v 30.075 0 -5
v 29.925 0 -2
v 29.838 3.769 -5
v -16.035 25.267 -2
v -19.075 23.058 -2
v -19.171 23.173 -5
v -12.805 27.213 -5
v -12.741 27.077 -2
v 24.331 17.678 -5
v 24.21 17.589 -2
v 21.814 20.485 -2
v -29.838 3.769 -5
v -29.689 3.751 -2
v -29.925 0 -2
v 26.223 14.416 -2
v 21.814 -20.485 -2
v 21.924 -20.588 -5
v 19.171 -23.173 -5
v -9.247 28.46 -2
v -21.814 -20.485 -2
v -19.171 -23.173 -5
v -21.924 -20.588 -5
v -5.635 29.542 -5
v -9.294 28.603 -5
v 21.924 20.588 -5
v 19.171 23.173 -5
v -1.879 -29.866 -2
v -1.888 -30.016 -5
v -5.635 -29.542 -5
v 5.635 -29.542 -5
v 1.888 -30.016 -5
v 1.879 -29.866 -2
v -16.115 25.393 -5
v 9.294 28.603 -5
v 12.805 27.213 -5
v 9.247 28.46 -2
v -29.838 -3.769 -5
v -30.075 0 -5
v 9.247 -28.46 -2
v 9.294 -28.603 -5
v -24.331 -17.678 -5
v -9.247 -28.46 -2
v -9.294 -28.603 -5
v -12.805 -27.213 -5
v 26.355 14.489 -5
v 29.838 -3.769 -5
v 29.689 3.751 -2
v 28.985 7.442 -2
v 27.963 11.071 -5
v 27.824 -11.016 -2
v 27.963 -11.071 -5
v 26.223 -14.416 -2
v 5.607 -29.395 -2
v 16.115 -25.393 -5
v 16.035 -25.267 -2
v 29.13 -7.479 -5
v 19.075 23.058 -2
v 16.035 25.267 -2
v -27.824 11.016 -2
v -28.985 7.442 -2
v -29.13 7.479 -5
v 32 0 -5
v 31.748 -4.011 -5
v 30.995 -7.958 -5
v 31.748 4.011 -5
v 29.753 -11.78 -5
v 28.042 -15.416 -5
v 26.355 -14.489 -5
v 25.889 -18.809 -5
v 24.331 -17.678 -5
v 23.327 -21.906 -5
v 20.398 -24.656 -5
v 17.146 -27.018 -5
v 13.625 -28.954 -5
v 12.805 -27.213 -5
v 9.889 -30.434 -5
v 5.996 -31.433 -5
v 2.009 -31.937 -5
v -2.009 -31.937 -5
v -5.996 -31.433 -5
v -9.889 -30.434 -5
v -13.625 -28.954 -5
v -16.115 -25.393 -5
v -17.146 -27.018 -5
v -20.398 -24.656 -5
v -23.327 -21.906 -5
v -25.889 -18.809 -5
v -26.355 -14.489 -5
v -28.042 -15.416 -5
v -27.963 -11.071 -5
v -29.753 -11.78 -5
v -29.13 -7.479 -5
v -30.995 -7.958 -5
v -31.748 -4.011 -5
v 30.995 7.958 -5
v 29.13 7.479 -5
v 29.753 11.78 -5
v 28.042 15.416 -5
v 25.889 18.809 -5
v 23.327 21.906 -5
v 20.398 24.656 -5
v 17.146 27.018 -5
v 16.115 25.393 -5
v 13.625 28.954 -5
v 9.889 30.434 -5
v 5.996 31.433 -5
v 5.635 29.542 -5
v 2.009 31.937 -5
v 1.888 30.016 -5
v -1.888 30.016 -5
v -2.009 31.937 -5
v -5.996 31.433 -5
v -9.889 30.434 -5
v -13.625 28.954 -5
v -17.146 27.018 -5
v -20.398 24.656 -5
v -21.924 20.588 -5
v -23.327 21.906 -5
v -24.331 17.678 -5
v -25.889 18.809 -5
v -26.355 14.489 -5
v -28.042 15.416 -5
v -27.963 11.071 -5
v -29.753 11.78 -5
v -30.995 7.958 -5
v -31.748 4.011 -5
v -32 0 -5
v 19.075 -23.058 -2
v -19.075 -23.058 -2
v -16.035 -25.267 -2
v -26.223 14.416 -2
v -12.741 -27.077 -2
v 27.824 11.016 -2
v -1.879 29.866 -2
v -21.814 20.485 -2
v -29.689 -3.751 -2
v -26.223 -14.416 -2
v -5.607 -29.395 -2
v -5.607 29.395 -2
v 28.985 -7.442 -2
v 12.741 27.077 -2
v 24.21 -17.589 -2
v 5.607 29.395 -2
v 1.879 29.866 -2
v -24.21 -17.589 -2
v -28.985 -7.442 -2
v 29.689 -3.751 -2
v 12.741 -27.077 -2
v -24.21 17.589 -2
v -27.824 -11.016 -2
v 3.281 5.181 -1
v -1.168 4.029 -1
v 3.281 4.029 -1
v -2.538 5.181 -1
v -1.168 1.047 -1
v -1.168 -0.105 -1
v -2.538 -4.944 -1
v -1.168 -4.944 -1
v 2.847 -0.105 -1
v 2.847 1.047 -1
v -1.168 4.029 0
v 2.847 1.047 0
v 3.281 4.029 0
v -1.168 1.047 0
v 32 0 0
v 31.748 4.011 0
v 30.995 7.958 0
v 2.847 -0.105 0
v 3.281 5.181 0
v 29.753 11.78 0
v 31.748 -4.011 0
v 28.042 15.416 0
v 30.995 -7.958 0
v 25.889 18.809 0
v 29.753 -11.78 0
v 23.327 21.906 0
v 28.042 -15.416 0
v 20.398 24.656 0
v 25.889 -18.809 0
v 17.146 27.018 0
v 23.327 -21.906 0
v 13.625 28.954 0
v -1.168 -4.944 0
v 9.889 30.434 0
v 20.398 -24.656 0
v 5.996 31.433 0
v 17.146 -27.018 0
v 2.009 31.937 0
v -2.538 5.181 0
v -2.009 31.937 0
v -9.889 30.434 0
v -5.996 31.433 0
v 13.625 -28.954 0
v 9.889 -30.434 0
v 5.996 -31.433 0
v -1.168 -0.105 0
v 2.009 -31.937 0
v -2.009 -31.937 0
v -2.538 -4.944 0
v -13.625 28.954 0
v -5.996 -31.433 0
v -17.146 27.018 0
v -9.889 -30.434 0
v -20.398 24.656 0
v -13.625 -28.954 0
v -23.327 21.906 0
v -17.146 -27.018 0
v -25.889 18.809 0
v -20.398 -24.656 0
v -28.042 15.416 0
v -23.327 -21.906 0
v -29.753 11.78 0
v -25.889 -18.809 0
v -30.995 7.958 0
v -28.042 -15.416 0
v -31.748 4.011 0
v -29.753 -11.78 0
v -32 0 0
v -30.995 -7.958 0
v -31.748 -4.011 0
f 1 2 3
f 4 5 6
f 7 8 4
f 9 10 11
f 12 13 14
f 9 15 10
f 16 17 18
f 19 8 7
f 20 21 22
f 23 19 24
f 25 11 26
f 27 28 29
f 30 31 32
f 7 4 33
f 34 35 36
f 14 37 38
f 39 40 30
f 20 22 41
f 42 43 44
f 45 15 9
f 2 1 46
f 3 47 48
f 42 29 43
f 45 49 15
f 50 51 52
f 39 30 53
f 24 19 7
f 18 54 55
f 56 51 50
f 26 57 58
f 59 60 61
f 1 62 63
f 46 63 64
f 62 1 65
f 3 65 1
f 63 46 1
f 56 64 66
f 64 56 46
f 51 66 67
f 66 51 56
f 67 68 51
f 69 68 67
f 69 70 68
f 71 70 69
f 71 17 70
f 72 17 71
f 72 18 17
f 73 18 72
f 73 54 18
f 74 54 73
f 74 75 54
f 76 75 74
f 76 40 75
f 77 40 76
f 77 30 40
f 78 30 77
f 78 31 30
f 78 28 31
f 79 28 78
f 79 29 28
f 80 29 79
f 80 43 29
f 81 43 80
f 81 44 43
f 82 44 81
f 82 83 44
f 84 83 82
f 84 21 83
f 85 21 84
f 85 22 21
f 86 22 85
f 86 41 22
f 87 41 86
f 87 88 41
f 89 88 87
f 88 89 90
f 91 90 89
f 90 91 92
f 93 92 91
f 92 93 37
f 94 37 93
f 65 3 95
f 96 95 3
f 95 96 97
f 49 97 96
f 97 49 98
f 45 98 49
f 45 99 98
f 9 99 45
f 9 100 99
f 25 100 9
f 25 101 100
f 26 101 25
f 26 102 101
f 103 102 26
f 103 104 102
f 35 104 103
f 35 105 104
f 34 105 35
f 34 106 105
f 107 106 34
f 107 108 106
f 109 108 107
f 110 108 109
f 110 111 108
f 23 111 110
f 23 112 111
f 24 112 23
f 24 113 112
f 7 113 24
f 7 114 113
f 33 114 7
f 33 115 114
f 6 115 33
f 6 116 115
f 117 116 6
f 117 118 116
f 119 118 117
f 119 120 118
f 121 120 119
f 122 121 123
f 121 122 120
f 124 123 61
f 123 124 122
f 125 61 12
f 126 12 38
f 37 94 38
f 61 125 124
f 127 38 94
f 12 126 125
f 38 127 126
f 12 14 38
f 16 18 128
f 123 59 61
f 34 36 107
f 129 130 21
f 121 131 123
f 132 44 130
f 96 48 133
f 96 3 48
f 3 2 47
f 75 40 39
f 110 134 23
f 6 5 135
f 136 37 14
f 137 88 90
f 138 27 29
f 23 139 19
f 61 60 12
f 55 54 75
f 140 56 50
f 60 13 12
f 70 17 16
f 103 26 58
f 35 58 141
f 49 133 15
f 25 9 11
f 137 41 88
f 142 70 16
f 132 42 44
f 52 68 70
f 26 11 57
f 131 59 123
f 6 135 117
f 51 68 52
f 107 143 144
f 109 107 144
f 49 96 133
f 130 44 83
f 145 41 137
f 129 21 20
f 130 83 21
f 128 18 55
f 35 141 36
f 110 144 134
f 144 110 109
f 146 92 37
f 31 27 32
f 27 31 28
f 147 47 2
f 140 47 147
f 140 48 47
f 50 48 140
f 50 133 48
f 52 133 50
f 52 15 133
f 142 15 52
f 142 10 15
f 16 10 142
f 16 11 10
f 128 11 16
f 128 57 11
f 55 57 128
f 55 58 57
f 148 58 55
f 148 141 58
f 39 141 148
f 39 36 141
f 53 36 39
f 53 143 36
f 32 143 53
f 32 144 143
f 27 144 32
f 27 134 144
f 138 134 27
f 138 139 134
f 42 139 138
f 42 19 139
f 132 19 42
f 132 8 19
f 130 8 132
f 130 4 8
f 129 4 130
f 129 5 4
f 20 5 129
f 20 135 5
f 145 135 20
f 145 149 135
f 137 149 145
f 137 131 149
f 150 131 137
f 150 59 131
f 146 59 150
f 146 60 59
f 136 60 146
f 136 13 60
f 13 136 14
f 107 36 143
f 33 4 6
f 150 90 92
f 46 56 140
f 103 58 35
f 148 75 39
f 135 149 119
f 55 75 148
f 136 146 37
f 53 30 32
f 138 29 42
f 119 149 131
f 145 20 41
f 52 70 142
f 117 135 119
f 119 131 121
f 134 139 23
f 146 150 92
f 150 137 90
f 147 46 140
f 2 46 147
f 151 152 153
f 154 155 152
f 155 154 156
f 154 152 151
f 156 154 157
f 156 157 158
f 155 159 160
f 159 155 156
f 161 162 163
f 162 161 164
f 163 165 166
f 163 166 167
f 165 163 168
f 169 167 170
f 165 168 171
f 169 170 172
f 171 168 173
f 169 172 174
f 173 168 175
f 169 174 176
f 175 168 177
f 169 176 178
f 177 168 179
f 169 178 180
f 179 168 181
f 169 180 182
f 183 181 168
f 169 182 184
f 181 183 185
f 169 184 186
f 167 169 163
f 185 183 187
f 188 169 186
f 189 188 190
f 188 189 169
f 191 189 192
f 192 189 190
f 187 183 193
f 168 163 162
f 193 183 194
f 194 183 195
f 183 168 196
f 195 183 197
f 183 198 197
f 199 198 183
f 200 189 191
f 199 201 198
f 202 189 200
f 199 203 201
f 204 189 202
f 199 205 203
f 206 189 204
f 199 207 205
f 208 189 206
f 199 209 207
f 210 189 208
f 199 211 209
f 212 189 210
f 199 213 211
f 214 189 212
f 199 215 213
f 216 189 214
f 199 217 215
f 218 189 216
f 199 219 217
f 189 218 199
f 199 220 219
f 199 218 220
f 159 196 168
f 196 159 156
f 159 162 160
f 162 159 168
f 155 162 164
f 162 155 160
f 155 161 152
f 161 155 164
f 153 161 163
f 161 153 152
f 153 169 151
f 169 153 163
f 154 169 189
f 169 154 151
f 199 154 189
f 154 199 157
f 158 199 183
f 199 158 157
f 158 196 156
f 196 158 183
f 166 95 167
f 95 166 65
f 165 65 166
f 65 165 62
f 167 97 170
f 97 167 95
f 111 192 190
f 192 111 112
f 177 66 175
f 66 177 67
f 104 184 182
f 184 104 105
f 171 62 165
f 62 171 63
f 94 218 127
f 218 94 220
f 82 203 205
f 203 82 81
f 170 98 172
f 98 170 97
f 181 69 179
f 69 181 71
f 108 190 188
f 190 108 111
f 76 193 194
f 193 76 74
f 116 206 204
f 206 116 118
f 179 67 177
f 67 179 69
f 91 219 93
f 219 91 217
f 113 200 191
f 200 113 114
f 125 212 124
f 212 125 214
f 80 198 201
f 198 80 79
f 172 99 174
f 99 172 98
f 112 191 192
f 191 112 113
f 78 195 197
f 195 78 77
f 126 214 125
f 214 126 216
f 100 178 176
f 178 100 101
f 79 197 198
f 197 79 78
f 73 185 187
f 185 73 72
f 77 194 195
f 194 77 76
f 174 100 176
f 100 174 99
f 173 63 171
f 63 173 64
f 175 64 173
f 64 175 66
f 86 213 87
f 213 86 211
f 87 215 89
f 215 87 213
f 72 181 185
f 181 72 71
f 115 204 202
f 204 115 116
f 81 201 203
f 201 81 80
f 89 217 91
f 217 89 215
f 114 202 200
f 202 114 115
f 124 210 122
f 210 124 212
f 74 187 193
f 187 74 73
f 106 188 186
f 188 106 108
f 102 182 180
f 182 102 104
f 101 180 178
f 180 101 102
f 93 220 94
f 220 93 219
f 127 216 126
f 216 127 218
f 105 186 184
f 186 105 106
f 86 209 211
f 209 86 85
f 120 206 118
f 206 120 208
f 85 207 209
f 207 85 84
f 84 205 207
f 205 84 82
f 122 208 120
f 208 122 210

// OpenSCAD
$fn = 50;

difference() {
	union() {
		translate(v = [0, 0, -5.0]) {
			cylinder(h = 5, r = 32.0);
		}
	}
	union() {
		#translate(v = [0, 0, -5.0]) {
			cylinder(h = 3, r1 = 30.075, r2 = 29.925);
		}
		translate(v = [0, 0, -1]) {
			linear_extrude(height = 1) {
				text(font = "Impact", halign = "center", size = 10, text = "F", valign = "center");
			}
		}
	}
}
